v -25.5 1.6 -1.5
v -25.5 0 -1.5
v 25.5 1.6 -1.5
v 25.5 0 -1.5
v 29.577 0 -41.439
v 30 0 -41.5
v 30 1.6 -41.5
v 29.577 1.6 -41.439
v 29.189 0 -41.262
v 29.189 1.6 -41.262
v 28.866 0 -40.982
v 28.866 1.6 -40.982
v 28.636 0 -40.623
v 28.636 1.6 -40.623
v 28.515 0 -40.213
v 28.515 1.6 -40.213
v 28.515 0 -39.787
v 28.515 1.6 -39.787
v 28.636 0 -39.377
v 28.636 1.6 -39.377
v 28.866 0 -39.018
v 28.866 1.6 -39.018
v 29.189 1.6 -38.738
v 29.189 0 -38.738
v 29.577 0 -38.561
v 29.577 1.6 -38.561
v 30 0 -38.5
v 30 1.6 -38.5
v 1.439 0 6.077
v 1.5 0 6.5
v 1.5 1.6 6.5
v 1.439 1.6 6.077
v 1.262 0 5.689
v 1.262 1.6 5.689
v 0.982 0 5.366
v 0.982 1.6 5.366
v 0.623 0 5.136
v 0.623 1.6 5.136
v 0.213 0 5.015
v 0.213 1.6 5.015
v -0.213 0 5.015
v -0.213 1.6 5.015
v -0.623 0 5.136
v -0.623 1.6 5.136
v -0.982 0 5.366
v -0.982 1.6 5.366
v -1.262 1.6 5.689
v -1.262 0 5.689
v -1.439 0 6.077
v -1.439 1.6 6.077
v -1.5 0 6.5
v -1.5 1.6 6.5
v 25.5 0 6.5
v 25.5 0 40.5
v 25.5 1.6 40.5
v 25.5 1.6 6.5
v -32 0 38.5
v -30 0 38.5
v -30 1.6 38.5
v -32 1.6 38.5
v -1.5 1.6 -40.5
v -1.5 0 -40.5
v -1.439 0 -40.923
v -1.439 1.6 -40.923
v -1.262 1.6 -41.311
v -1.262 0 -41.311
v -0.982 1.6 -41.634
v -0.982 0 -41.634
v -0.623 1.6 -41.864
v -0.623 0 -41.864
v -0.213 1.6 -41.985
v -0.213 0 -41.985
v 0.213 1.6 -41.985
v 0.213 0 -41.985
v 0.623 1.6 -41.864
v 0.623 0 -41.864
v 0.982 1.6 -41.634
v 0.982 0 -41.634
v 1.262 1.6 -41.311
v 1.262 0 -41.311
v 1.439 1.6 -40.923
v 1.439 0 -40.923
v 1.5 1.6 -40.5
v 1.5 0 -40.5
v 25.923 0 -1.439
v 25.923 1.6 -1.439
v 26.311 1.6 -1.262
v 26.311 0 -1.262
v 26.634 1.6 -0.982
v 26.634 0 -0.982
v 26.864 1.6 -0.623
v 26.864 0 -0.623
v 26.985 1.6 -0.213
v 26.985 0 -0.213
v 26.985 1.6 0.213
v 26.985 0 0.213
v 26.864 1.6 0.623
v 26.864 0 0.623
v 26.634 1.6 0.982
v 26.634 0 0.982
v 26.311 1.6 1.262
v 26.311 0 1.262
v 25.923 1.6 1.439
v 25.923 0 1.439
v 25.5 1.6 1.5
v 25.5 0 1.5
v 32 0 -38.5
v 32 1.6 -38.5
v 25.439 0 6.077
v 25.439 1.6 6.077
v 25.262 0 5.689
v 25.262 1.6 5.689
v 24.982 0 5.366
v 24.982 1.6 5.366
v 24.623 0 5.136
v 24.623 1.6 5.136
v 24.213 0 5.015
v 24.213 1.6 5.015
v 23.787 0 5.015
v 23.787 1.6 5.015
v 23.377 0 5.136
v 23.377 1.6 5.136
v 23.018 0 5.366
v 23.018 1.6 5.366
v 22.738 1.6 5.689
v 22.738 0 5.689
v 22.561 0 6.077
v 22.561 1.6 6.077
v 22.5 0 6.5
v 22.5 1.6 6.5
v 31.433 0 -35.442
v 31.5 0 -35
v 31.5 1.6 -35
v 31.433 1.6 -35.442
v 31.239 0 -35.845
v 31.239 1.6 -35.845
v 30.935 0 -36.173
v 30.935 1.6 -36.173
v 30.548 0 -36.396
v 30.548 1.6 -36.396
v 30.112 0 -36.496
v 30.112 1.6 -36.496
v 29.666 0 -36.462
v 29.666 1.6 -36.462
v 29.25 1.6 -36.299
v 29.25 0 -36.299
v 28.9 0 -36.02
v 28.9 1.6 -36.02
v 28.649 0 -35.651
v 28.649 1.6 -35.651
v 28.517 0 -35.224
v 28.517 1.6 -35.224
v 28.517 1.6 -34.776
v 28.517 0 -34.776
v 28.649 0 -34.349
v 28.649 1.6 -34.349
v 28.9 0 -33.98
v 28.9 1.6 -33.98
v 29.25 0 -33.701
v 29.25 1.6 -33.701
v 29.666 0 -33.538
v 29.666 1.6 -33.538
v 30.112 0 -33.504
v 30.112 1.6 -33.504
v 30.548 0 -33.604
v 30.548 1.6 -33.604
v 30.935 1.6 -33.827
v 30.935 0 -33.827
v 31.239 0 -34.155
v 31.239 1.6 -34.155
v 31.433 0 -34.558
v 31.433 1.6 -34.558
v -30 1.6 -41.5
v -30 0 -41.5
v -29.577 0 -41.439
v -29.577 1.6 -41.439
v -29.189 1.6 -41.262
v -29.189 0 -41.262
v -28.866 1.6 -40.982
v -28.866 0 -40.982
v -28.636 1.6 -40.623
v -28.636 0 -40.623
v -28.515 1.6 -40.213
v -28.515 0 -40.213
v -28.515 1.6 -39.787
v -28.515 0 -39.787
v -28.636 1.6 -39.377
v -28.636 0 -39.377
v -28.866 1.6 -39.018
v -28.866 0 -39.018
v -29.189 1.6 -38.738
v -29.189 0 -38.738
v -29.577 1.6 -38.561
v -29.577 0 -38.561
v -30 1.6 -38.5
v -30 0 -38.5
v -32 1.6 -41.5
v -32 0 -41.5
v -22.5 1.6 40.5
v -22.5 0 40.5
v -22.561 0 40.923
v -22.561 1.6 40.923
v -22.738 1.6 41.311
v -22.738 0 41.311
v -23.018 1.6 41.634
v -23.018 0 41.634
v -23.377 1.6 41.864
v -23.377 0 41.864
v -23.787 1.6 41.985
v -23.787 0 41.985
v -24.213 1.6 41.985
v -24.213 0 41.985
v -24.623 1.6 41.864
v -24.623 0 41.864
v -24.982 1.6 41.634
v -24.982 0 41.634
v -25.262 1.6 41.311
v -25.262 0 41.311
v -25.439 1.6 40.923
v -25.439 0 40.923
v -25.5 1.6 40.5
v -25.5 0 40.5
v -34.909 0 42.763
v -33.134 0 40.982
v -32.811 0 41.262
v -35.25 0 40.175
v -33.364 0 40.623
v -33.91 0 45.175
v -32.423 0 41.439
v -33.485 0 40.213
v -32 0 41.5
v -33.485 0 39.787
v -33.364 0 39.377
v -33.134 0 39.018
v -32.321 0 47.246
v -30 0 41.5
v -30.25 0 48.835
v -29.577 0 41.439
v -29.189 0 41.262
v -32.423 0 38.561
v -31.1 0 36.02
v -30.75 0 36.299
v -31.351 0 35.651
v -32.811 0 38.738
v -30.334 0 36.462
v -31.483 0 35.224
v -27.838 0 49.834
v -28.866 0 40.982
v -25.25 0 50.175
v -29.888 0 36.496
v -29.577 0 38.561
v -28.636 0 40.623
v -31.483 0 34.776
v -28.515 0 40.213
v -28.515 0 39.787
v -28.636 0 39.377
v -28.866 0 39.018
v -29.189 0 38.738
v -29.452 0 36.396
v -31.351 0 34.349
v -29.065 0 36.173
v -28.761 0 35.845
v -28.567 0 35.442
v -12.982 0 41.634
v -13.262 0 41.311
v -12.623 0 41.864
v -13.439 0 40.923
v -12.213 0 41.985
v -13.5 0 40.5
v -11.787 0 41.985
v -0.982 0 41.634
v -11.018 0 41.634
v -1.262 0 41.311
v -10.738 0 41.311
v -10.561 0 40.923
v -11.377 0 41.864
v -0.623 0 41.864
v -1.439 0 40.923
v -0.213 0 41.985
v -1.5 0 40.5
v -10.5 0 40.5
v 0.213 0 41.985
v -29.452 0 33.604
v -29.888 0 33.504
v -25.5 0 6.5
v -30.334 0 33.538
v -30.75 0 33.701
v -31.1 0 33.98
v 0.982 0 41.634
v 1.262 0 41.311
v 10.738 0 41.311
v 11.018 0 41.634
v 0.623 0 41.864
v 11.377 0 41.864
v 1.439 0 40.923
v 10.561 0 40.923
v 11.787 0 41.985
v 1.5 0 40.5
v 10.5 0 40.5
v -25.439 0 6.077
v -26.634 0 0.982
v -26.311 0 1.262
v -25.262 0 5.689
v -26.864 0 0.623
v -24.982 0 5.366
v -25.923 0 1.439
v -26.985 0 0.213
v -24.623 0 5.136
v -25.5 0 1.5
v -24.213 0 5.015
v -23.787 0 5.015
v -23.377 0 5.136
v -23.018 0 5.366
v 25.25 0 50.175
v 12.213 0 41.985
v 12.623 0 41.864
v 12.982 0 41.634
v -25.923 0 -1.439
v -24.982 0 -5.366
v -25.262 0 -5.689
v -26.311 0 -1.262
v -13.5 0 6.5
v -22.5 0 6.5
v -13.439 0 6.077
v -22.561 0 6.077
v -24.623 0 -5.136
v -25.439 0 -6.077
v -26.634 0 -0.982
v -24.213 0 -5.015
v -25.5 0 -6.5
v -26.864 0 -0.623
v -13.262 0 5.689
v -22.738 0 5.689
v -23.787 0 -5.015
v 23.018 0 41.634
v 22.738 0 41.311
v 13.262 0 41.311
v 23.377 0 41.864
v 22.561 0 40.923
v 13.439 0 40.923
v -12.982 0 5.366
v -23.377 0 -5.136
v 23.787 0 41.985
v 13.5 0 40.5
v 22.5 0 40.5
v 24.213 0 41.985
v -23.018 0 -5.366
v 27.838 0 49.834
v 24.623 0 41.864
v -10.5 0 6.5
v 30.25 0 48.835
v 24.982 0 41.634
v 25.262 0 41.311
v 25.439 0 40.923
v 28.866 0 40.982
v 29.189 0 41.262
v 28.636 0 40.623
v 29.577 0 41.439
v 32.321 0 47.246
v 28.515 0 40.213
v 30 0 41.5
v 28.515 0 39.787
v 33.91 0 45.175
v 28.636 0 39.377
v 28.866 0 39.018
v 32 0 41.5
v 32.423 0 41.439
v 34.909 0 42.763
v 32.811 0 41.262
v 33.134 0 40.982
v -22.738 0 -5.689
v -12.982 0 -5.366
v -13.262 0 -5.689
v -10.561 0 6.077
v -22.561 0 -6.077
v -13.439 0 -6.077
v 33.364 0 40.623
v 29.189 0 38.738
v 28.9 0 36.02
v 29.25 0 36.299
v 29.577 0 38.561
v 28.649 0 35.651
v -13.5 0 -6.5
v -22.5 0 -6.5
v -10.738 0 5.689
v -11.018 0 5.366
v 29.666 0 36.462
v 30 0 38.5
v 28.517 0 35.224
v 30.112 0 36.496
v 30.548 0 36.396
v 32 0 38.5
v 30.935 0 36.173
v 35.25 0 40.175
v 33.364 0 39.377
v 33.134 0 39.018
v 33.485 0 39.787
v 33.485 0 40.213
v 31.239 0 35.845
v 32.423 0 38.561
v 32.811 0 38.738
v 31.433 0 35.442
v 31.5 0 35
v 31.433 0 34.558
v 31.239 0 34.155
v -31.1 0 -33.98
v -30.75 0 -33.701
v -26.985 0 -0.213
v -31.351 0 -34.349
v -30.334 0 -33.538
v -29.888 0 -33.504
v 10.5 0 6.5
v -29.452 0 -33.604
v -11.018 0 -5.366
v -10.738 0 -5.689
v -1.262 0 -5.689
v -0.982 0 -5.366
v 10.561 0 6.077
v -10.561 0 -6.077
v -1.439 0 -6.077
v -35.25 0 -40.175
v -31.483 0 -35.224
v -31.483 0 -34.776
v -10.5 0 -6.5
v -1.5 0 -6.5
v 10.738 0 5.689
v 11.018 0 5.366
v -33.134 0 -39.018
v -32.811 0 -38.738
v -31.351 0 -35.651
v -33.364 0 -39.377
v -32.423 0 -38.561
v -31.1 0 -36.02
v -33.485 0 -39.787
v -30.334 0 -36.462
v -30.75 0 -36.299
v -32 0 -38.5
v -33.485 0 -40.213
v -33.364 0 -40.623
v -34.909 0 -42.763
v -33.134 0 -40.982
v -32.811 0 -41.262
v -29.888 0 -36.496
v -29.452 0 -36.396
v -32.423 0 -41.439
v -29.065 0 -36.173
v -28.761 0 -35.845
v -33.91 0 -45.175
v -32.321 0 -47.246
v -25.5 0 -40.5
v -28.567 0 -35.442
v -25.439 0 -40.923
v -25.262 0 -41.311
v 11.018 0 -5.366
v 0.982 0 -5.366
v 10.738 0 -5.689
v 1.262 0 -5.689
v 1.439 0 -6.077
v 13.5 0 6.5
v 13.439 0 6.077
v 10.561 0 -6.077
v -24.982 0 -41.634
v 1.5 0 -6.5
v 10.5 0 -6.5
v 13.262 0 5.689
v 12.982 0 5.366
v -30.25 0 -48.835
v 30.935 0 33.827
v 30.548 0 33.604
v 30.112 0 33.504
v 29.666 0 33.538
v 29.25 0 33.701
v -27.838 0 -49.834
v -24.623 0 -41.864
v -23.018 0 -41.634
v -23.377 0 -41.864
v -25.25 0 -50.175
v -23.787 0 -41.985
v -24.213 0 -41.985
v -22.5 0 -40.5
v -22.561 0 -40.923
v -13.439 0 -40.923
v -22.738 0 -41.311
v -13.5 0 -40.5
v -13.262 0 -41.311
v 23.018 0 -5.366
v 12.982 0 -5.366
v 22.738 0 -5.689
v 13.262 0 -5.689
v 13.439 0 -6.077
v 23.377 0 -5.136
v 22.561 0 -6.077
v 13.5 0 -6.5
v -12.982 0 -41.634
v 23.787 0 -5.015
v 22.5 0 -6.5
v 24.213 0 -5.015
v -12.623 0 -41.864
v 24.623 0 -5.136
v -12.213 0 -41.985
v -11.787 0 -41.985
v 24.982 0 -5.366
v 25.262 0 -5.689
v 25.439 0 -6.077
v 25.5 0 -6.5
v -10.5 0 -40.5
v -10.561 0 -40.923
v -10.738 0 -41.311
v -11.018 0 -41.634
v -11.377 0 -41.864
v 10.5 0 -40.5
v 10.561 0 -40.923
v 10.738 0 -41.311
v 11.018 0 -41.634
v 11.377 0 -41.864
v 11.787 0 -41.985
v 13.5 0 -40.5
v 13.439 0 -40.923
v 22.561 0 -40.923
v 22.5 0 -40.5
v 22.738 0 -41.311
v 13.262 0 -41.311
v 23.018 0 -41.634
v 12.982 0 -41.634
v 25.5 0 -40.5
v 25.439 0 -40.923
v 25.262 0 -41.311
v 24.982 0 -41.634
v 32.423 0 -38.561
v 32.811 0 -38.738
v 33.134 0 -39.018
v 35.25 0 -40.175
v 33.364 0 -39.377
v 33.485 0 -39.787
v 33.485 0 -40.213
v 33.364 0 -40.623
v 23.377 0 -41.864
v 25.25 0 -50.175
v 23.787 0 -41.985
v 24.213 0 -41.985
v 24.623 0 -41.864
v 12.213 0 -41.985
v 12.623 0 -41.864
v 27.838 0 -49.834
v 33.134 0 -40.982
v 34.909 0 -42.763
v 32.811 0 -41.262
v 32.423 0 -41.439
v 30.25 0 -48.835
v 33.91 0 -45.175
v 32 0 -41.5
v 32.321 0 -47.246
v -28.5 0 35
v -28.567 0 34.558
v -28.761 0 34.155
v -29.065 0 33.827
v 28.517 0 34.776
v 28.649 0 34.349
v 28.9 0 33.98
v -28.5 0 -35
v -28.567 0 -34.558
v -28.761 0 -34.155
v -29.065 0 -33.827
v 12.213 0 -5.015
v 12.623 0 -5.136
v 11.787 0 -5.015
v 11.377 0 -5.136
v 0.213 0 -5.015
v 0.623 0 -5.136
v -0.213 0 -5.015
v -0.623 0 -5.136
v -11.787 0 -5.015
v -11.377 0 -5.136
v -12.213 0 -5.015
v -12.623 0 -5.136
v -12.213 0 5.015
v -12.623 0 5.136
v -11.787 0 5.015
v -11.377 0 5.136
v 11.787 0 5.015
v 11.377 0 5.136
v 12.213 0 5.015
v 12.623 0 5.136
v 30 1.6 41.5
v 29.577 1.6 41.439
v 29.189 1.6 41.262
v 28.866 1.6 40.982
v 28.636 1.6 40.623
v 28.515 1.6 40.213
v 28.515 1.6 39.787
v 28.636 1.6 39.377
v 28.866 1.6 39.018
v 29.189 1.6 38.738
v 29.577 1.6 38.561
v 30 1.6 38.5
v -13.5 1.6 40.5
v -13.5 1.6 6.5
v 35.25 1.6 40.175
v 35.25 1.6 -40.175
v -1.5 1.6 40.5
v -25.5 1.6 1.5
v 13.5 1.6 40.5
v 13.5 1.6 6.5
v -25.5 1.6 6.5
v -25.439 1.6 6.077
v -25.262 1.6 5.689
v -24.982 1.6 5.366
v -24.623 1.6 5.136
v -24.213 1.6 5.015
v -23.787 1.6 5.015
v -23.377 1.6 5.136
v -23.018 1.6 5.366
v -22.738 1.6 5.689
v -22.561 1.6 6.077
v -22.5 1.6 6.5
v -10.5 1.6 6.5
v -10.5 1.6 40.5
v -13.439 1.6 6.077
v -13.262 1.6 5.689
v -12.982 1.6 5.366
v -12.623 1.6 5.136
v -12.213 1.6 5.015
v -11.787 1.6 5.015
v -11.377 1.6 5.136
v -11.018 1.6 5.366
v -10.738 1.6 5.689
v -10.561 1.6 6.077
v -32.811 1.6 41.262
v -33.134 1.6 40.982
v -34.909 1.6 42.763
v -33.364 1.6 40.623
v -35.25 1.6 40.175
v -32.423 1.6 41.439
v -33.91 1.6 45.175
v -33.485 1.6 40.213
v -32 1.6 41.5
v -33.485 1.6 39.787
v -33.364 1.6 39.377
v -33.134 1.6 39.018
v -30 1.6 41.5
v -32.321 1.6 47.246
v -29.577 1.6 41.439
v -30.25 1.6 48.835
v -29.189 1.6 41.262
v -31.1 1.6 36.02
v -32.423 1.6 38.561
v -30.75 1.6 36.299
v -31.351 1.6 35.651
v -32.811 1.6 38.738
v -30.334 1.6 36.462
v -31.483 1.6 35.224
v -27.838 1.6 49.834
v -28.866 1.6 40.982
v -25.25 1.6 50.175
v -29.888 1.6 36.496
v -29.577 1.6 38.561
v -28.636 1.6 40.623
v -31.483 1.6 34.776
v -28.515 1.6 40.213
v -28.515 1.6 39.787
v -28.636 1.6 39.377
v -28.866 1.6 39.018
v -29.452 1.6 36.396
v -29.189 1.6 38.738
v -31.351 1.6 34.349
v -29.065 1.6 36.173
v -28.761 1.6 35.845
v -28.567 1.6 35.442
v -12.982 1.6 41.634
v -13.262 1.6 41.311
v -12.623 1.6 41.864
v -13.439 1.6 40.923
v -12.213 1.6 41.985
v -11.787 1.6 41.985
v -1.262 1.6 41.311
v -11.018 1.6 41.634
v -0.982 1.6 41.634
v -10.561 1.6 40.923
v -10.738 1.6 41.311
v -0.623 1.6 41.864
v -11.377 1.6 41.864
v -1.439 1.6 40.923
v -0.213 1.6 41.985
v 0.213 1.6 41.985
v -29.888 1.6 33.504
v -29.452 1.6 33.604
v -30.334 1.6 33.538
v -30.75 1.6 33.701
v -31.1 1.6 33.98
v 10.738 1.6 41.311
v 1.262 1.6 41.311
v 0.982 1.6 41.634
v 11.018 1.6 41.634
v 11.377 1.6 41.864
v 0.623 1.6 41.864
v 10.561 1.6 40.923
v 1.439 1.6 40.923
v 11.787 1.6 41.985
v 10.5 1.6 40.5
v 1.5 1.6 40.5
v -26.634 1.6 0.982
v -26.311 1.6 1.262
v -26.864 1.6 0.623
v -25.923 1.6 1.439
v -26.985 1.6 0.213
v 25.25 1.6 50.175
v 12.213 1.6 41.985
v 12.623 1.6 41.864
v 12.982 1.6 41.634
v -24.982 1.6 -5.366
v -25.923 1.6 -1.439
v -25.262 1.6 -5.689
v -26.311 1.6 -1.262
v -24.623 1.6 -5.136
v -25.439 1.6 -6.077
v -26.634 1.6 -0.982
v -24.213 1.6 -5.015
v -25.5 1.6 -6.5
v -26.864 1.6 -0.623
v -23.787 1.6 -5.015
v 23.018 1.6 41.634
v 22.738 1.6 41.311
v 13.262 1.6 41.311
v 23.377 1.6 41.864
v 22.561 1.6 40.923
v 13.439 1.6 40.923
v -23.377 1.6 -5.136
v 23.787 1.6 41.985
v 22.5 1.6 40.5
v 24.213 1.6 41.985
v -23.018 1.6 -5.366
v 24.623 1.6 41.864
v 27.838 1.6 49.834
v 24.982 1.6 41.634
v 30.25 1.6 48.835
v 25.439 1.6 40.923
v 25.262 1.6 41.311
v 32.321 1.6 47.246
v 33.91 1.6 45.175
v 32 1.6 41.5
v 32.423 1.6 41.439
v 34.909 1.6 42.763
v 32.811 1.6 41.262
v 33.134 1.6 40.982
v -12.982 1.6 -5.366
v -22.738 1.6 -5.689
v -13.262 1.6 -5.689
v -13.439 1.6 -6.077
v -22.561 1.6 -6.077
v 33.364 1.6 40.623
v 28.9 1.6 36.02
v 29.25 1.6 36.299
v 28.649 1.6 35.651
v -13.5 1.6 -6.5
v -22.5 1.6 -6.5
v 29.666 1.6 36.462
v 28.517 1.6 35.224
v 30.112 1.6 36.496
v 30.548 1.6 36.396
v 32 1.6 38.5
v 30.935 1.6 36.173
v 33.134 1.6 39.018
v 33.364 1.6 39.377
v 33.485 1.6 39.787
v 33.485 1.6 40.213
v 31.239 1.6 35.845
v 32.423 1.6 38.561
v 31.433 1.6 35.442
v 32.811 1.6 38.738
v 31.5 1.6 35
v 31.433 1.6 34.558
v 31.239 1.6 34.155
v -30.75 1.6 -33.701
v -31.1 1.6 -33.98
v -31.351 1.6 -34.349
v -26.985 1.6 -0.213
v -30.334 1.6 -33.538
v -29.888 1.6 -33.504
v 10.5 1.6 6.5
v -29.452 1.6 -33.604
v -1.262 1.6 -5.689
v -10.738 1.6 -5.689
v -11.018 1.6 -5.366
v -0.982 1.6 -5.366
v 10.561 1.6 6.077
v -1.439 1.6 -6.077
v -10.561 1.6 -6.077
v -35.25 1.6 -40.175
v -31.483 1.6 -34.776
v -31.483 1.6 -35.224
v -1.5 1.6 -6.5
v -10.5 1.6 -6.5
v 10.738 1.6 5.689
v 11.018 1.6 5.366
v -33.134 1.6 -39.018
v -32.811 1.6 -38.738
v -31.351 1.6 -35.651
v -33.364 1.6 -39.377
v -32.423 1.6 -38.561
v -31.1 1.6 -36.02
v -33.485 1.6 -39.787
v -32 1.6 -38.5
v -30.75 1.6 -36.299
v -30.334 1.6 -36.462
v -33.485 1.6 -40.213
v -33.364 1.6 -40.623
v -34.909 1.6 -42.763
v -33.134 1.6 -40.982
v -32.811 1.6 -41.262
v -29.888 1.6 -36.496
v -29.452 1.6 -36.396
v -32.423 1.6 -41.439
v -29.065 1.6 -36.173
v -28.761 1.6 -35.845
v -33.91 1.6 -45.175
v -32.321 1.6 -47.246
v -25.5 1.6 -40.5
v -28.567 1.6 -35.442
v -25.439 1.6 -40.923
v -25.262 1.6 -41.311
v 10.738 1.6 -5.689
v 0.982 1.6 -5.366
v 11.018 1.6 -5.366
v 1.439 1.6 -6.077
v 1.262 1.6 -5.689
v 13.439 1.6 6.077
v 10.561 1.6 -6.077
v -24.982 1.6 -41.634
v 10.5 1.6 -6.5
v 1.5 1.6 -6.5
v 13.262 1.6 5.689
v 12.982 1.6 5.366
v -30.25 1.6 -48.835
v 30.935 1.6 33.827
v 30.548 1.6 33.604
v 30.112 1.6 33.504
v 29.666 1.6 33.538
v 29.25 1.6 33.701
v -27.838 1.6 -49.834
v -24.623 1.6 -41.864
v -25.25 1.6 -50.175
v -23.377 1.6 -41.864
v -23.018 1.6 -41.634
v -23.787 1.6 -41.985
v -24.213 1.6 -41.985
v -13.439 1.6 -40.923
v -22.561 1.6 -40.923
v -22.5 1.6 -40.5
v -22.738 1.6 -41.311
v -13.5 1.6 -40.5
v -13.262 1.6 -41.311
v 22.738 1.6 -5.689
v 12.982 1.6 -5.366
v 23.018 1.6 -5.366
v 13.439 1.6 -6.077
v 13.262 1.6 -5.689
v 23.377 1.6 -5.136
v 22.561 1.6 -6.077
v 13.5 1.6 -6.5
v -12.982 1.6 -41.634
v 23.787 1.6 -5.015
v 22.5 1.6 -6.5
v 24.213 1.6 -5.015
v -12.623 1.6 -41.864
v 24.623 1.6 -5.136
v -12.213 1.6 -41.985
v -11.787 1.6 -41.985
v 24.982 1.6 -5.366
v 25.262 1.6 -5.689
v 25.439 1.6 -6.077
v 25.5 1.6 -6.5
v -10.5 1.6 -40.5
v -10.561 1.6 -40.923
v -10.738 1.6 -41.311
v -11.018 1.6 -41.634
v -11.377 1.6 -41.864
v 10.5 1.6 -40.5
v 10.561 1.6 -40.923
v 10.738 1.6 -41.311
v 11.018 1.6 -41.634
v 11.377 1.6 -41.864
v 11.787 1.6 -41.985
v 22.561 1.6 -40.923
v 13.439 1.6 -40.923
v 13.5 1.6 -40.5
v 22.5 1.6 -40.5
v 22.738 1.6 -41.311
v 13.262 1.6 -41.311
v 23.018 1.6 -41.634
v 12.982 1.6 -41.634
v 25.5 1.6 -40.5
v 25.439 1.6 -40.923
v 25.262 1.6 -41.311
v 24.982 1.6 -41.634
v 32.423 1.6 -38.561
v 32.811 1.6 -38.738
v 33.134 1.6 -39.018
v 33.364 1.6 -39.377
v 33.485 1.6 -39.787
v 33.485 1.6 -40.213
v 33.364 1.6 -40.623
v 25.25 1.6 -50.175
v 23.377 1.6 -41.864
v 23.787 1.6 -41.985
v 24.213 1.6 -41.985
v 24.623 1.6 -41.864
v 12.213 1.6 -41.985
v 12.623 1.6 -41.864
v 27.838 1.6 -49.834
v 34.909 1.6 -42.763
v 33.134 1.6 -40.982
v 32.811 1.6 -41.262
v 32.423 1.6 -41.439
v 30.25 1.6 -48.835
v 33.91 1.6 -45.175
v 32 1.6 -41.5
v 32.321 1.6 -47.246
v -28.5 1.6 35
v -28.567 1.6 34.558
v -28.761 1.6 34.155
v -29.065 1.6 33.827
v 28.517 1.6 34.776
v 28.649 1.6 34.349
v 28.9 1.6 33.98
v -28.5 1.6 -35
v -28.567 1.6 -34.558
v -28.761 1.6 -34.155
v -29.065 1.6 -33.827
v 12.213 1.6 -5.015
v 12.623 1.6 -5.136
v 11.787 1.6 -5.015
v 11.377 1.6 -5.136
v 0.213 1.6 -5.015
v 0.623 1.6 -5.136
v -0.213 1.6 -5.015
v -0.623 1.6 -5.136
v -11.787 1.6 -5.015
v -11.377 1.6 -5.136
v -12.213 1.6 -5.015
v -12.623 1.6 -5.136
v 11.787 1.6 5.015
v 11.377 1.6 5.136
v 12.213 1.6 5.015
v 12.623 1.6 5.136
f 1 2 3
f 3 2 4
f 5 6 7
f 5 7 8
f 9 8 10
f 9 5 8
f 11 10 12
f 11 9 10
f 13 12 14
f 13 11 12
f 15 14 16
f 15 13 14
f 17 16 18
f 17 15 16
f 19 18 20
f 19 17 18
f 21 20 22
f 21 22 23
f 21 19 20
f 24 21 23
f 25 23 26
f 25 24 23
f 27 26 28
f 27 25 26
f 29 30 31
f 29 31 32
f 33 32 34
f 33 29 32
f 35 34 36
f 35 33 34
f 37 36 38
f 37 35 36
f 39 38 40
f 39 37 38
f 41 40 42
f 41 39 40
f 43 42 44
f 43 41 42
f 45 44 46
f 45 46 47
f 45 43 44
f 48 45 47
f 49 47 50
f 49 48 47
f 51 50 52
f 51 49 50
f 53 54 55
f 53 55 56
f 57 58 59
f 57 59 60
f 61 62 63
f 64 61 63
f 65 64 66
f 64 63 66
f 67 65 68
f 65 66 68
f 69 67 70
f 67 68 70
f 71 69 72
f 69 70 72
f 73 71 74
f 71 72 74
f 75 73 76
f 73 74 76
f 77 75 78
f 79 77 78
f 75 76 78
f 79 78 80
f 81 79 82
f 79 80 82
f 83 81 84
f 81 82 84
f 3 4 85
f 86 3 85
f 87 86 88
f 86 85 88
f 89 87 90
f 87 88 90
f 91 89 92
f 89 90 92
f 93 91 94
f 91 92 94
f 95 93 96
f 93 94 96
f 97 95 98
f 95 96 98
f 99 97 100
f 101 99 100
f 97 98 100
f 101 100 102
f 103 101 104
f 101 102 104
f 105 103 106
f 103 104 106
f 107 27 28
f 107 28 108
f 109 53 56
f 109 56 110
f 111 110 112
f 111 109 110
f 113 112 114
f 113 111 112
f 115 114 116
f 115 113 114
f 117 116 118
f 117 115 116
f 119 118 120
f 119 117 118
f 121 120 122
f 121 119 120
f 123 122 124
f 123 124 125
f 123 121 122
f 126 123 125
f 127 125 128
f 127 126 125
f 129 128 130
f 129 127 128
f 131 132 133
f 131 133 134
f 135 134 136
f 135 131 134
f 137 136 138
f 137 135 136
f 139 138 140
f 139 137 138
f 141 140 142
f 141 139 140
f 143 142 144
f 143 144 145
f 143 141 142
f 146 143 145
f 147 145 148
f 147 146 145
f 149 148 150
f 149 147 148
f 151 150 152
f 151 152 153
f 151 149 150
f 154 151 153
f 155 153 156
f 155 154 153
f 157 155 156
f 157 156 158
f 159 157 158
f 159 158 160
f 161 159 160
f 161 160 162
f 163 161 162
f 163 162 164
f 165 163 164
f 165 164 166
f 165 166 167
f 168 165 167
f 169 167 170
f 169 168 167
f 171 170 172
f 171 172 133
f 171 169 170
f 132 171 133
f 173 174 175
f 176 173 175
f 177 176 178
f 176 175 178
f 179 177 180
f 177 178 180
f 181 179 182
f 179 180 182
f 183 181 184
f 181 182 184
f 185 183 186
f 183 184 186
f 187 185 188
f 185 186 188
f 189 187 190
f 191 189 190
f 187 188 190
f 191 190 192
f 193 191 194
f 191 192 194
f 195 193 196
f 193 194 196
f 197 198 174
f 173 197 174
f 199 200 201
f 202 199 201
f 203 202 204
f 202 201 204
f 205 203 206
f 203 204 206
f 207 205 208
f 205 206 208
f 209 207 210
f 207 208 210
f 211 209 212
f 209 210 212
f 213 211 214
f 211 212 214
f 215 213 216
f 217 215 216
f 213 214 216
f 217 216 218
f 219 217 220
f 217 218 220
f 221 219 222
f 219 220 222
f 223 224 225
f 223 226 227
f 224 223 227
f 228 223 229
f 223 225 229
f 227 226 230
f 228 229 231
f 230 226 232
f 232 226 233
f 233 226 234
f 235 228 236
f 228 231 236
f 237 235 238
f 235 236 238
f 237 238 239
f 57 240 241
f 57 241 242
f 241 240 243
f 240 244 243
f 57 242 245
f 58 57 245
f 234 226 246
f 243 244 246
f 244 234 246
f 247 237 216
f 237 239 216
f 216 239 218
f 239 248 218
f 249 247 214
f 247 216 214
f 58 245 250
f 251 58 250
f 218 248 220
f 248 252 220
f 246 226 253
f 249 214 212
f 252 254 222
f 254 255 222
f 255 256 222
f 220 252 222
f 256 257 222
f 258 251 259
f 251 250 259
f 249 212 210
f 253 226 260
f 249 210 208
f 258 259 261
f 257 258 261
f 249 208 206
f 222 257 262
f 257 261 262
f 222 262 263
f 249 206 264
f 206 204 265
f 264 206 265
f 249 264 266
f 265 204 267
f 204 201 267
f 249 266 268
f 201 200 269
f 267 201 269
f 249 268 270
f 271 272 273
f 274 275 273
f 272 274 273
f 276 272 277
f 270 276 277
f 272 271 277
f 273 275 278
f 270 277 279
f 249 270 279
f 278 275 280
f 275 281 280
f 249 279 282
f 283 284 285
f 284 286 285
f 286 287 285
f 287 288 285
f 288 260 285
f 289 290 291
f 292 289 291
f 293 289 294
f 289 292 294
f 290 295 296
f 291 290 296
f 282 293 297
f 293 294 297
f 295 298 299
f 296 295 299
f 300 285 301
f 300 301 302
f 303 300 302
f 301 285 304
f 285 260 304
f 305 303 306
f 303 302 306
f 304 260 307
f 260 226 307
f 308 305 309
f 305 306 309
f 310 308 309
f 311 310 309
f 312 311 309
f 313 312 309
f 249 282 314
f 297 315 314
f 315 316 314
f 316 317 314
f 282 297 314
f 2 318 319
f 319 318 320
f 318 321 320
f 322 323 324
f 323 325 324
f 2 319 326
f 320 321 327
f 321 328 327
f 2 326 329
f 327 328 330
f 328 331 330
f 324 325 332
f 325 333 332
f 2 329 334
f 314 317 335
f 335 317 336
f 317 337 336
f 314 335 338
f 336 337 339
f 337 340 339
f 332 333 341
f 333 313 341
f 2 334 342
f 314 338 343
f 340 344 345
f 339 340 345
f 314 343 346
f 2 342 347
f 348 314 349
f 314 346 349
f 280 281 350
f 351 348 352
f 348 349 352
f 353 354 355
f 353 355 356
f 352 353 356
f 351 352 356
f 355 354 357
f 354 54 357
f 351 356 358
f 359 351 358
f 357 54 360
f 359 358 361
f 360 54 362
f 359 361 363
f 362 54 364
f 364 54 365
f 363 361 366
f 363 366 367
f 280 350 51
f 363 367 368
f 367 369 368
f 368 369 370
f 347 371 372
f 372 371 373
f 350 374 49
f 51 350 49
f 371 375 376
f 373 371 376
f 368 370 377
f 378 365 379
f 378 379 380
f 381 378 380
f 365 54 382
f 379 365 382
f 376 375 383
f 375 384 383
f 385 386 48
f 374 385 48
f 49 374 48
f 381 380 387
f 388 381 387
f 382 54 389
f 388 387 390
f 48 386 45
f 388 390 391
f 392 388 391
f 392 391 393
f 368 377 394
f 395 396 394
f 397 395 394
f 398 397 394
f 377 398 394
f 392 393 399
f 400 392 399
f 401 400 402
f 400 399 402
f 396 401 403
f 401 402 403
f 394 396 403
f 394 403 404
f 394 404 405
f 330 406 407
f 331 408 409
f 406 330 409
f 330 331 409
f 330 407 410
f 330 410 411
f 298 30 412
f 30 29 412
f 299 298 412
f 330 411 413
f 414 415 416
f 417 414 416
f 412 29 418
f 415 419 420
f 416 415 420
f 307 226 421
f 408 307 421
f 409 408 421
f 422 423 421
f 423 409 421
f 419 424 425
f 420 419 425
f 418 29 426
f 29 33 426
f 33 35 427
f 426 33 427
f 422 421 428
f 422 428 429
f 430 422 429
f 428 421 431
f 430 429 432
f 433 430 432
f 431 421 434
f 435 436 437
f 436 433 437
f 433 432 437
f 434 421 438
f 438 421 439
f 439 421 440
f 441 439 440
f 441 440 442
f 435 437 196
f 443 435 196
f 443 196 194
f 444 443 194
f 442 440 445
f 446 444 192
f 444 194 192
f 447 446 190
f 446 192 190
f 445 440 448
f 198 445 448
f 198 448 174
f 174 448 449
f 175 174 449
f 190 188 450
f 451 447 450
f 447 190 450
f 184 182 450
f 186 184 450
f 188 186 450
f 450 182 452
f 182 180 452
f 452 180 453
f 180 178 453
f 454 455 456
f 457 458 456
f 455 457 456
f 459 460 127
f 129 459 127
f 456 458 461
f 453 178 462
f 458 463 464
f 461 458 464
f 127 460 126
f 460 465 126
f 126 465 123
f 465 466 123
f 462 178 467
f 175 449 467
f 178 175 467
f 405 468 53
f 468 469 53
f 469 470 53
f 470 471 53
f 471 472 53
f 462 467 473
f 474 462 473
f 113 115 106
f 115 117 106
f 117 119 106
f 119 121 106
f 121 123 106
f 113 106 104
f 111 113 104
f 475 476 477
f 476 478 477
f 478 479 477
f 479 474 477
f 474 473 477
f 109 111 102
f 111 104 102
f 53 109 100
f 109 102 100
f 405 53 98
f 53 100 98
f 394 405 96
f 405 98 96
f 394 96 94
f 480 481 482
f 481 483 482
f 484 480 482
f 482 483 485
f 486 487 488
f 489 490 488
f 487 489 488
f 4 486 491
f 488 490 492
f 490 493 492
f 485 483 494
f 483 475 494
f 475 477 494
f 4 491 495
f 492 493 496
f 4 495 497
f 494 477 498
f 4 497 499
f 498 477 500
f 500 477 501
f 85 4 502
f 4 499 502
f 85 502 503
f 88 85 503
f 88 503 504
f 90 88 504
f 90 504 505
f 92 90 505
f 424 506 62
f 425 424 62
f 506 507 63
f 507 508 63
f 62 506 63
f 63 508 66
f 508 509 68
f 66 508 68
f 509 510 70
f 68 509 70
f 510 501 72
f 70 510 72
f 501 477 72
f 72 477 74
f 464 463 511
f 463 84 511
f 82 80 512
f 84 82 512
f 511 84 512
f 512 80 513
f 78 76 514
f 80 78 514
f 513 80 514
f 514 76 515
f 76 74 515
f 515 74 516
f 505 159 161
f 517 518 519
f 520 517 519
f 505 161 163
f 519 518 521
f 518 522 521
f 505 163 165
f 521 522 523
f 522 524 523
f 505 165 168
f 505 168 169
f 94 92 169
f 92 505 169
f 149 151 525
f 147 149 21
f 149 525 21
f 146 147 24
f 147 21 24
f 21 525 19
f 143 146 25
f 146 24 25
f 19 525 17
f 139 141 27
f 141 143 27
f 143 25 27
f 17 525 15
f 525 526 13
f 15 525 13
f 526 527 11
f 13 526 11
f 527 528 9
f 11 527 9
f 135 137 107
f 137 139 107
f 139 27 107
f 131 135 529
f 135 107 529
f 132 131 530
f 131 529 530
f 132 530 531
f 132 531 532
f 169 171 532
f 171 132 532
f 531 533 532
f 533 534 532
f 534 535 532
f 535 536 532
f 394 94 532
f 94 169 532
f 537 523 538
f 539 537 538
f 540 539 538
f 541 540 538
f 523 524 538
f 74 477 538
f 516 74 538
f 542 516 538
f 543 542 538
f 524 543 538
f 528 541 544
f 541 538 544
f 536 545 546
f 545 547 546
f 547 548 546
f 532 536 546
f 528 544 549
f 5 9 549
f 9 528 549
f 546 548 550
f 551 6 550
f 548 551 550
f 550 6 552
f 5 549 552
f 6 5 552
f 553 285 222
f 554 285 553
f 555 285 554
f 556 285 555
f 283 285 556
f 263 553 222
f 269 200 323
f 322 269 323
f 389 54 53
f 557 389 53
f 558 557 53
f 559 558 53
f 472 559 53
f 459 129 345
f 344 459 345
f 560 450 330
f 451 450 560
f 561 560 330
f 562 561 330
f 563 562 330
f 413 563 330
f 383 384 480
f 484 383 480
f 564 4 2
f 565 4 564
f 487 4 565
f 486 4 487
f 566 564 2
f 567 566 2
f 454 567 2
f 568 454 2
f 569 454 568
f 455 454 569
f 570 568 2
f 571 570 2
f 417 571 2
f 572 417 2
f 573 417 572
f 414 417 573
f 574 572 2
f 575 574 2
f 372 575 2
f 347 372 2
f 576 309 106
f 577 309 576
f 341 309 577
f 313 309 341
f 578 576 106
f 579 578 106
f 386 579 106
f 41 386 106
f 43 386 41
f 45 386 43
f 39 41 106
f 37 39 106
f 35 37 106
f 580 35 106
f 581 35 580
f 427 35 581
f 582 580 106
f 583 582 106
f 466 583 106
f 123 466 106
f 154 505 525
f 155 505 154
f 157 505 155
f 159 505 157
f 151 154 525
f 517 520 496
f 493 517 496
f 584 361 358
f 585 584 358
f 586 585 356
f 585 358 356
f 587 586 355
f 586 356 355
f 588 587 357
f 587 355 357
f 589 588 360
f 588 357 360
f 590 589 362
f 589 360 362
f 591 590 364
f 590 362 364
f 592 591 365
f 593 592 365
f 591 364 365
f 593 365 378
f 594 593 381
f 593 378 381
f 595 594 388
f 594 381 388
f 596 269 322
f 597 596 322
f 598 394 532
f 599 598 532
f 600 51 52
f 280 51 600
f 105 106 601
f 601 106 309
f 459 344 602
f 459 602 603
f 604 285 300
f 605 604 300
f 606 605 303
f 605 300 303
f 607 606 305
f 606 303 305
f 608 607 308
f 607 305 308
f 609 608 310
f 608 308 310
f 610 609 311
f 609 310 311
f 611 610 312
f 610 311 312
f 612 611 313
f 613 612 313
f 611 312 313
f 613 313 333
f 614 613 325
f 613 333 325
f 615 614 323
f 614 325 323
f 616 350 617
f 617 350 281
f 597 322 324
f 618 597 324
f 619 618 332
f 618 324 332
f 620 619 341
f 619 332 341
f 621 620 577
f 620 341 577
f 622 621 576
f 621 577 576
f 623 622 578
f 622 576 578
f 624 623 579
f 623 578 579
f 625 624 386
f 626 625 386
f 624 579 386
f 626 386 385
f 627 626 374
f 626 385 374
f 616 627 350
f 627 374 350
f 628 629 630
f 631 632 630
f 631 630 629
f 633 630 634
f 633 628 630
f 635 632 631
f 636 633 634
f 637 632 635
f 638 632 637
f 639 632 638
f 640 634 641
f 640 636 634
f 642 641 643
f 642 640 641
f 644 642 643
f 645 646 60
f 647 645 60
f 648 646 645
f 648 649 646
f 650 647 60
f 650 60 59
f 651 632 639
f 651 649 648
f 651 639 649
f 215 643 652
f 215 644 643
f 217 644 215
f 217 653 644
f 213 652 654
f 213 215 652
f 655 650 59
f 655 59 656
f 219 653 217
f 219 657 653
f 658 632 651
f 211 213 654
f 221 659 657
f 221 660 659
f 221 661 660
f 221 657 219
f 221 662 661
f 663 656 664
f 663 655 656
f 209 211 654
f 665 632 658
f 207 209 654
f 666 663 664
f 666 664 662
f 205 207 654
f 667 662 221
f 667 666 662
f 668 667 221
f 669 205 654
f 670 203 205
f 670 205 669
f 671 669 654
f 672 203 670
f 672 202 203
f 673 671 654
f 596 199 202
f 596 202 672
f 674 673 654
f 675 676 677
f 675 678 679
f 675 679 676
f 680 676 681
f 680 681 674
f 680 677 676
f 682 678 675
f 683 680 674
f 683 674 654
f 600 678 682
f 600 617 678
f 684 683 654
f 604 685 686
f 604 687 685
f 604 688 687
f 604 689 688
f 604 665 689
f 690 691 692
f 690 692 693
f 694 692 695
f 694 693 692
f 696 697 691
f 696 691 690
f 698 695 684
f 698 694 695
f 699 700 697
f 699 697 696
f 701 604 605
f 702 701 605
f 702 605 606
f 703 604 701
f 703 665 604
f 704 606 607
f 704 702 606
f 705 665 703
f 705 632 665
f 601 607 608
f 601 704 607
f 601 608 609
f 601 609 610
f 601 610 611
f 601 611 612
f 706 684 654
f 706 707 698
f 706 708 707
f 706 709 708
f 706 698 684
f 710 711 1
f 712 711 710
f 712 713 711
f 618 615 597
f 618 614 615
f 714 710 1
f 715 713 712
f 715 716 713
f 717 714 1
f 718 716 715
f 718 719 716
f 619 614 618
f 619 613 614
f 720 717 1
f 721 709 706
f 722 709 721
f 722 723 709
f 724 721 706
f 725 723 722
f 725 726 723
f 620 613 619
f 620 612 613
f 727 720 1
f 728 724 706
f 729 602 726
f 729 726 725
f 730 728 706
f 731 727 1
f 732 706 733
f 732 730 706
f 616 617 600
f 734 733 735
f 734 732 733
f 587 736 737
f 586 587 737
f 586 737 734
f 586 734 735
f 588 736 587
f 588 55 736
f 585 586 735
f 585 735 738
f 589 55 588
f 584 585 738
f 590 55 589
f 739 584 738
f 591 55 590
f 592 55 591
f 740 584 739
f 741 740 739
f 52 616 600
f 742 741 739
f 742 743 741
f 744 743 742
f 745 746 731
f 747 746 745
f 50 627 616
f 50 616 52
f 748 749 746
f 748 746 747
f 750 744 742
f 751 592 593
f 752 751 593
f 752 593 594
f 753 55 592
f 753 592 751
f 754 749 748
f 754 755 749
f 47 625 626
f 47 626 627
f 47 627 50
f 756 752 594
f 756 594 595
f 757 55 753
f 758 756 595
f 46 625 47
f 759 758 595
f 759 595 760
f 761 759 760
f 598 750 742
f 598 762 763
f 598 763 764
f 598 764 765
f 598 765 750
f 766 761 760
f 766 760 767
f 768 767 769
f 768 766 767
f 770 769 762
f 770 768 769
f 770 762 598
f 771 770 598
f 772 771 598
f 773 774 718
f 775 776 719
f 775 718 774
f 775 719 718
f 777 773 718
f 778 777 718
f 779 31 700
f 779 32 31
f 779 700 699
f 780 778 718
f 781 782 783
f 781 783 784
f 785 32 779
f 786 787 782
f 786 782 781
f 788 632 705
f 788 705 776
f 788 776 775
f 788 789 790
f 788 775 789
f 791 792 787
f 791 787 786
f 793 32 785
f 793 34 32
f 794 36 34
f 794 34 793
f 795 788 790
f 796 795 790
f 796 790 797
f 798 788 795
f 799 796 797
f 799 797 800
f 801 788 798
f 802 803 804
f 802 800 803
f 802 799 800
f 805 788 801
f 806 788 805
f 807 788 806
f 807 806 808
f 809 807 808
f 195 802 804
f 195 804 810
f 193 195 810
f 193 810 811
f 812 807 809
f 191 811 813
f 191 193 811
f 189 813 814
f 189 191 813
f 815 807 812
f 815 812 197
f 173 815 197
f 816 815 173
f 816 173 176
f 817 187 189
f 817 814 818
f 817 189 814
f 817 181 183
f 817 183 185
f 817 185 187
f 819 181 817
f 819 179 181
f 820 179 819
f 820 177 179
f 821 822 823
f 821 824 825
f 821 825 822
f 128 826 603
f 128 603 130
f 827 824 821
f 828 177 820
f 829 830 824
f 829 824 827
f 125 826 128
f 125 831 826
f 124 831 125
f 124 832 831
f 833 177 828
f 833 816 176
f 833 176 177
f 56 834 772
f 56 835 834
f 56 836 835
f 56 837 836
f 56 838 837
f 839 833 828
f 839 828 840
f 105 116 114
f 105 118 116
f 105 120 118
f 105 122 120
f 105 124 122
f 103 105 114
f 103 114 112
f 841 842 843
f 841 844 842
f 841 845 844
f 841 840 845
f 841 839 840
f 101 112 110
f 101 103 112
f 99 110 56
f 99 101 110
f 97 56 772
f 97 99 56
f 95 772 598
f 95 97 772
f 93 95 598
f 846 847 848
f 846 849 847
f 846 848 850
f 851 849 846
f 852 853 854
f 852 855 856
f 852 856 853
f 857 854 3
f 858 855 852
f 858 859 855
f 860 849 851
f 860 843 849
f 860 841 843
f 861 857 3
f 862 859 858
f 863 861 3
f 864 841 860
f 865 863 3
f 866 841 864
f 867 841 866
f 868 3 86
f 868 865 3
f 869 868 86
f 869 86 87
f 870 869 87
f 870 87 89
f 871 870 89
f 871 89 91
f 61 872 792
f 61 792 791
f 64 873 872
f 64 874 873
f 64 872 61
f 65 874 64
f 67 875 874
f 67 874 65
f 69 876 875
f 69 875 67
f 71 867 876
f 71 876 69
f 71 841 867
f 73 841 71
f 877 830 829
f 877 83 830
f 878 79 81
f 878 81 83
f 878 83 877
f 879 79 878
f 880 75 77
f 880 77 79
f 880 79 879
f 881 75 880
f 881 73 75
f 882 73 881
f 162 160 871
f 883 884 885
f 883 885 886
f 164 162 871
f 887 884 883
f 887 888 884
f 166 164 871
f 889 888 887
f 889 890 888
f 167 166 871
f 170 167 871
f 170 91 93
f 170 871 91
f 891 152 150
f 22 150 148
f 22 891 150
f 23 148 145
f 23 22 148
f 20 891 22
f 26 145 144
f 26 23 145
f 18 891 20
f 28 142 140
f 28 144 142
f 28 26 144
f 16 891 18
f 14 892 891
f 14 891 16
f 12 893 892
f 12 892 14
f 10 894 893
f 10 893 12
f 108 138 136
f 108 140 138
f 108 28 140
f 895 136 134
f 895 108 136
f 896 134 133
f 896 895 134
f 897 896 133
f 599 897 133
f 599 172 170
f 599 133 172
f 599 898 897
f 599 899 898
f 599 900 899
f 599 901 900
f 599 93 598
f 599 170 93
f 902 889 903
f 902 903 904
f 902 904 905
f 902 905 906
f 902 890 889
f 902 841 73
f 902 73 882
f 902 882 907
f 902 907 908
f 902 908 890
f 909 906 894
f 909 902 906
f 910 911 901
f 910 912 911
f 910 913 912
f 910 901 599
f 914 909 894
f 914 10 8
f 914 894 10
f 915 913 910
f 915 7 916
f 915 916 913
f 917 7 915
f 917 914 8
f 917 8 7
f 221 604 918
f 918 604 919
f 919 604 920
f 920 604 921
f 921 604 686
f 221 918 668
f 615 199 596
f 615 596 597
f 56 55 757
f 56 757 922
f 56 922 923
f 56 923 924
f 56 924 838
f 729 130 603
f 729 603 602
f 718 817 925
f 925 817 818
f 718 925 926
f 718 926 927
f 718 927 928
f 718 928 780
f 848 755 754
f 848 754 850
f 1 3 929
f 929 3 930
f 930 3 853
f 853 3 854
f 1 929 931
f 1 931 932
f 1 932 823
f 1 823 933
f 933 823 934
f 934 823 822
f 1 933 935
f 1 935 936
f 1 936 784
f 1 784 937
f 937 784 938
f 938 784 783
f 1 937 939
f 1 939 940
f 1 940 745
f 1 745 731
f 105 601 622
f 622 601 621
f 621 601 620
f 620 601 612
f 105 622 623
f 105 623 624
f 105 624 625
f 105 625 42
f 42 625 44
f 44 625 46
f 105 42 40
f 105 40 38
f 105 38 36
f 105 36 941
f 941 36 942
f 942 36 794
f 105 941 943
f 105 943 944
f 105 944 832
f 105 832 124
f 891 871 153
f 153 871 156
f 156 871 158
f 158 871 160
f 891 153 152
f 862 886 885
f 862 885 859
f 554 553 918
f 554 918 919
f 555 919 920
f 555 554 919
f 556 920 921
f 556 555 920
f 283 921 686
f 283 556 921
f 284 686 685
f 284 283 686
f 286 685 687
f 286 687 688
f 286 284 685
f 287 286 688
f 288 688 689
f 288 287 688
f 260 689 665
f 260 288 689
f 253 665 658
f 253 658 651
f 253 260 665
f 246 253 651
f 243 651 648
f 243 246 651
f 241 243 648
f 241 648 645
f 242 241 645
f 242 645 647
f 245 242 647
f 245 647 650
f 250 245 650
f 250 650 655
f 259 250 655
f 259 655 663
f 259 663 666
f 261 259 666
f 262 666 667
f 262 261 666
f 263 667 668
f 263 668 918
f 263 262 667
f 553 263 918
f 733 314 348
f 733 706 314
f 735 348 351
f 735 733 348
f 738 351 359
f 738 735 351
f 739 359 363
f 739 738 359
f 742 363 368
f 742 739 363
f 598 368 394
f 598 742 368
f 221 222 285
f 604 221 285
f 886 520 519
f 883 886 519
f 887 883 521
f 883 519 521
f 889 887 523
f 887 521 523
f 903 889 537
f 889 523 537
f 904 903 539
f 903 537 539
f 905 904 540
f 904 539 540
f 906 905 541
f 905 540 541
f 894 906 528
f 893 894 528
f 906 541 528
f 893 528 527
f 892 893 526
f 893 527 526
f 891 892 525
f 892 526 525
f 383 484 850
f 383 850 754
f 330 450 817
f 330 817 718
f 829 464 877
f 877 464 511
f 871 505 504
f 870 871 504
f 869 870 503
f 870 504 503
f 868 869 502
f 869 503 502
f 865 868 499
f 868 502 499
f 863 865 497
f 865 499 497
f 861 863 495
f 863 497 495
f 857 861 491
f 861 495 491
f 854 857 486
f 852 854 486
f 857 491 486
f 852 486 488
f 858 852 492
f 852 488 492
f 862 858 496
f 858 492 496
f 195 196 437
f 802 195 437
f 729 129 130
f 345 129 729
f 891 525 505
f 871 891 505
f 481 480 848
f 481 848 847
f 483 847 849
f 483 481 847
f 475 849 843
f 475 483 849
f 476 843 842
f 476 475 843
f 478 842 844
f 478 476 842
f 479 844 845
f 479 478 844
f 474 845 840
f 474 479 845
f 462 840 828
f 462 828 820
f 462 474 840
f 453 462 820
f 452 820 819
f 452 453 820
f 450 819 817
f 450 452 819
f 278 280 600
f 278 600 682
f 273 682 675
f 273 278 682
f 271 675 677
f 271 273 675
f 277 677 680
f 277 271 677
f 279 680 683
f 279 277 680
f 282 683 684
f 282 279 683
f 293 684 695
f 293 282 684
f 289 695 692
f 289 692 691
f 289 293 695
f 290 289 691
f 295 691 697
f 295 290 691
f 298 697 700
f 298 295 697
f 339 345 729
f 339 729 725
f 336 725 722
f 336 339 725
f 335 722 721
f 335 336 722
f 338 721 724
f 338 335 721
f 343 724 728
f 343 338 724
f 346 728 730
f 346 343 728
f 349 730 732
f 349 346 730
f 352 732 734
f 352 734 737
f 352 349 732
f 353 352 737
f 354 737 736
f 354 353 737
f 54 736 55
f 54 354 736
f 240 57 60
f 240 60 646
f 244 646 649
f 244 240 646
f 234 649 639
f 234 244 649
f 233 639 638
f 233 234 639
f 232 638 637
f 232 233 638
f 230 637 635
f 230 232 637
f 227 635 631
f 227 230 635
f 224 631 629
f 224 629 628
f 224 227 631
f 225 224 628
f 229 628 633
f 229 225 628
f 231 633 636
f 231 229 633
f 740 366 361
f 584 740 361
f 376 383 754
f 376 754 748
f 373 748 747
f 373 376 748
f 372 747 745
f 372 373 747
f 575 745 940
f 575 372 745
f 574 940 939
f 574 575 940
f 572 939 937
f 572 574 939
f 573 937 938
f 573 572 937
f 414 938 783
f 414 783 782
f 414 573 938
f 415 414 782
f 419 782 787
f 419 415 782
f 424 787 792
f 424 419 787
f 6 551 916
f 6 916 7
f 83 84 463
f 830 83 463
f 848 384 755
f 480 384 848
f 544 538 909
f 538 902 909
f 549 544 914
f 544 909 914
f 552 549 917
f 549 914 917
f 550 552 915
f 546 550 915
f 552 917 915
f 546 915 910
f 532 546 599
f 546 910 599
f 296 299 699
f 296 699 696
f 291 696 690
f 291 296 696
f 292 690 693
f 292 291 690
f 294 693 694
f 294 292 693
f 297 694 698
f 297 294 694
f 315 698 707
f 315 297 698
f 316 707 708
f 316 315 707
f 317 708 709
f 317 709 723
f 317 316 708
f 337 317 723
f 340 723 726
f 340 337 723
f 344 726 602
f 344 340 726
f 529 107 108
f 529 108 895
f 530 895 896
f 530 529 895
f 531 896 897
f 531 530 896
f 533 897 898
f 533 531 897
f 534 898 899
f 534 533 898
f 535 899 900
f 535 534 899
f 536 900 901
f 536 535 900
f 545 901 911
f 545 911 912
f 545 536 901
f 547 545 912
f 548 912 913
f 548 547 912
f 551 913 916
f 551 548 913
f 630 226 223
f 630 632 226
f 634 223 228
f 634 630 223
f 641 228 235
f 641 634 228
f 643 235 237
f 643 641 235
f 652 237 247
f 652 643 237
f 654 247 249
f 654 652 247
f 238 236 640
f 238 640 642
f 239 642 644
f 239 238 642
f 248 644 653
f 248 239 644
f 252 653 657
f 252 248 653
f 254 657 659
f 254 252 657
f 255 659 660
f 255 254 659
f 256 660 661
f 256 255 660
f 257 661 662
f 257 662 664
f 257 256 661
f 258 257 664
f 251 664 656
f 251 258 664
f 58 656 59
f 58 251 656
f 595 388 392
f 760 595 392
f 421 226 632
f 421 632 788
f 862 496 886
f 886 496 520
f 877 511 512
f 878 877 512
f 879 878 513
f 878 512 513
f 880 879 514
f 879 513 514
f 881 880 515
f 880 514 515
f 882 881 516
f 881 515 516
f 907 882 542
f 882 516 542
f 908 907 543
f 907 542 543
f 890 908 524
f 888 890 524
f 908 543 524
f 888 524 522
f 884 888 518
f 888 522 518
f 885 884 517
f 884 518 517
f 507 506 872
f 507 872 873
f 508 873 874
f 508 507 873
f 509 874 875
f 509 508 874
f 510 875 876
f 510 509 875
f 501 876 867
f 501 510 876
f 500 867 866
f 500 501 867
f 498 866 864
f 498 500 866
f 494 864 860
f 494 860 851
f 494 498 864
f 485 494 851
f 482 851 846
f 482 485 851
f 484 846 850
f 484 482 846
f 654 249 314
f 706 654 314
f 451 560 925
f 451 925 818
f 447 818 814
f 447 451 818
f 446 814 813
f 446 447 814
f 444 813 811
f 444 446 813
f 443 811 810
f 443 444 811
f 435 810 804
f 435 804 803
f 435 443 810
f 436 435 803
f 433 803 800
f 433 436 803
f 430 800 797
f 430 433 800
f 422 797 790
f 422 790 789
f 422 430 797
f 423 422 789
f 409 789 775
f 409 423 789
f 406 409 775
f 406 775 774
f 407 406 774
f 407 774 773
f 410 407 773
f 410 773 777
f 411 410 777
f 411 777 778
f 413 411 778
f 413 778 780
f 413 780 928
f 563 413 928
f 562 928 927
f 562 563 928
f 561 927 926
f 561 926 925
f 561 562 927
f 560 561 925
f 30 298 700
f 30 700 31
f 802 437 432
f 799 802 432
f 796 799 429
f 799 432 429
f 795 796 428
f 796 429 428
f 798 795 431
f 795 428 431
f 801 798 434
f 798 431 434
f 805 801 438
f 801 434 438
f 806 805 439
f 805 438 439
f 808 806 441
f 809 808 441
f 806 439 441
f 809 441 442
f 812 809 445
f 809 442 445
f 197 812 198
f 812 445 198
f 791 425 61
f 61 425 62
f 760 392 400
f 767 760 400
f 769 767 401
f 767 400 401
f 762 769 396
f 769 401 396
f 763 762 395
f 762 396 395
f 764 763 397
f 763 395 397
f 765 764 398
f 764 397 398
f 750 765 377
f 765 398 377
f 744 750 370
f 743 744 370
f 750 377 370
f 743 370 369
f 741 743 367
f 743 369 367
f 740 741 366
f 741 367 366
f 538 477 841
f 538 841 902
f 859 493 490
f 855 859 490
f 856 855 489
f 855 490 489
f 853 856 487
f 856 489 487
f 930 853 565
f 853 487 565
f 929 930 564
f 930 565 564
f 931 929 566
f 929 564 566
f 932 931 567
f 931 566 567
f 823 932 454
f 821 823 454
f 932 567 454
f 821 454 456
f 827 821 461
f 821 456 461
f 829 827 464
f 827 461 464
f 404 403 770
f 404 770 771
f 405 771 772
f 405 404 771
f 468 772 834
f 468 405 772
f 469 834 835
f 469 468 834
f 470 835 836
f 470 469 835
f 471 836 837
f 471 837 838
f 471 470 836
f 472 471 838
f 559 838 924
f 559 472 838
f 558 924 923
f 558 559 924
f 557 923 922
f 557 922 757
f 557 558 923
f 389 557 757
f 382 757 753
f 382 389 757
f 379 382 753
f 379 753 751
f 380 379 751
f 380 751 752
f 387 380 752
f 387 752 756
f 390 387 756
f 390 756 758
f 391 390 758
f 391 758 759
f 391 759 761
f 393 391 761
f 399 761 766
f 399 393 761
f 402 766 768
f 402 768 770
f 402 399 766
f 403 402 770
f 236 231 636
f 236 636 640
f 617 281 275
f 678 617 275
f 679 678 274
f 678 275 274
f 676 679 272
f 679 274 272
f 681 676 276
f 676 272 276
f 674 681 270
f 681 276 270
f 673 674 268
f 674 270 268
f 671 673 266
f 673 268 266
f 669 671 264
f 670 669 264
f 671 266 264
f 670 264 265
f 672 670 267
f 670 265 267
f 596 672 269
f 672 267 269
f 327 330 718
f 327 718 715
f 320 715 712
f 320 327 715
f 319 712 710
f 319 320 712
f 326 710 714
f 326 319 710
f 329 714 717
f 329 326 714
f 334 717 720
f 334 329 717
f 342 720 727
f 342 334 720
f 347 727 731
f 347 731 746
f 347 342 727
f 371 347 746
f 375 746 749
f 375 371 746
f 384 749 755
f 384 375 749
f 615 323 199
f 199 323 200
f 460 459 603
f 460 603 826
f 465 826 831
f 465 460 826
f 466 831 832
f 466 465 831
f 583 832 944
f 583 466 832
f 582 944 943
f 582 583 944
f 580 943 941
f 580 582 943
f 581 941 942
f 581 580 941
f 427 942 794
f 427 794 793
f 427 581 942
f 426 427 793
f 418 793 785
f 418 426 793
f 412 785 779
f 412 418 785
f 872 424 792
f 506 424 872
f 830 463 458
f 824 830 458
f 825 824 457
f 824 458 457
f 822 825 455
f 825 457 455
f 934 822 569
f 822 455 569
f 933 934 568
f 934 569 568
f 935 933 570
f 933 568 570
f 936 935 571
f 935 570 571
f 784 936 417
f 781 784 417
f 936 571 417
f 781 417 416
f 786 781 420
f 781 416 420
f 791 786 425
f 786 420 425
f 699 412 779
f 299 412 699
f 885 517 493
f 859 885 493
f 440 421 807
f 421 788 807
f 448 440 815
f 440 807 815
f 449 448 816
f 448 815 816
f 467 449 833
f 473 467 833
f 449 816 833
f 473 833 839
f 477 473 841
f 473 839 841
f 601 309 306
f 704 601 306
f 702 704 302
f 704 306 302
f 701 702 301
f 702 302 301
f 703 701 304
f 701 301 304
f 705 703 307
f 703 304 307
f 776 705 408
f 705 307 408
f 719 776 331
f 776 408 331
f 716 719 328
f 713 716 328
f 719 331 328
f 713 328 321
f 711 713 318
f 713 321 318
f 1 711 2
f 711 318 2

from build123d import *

# Parameters (mm, degrees)
SKETCH_1_W      = 70.5
SKETCH_1_H      = 100.35
SKETCH_1_R      = 1.5
EXTRUDE_1_DEPTH = 1.6
FILLET_1_R      = 10


with BuildPart() as part:
    # 草圖1 → 填料-伸長1 (new body)
    with BuildSketch(Plane(origin=(0, 0, 0), x_dir=(1, 0, 0), z_dir=(0, 1, 0))):
        Rectangle(SKETCH_1_W, SKETCH_1_H)
        with Locations((-30, 35)):
            Circle(SKETCH_1_R, mode=Mode.SUBTRACT)
        with Locations((30, 35)):
            Circle(SKETCH_1_R, mode=Mode.SUBTRACT)
        with Locations((-30, -35)):
            Circle(SKETCH_1_R, mode=Mode.SUBTRACT)
        with Locations((30, -35)):
            Circle(SKETCH_1_R, mode=Mode.SUBTRACT)
        with BuildLine():
            Line((-25.5, 1.5), (25.5, 1.5))
            ThreePointArc((25.5, 1.5), (27, 0), (25.5, -1.5))
            Line((25.5, -1.5), (-25.5, -1.5))
            ThreePointArc((-25.5, -1.5), (-27, 0), (-25.5, 1.5))
        make_face(mode=Mode.SUBTRACT)
        with BuildLine():
            Line((1.5, 40.5), (1.5, 6.5))
            ThreePointArc((1.5, 6.5), (0, 5), (-1.5, 6.5))
            Line((-1.5, 6.5), (-1.5, 40.5))
            ThreePointArc((-1.5, 40.5), (0, 42), (1.5, 40.5))
        make_face(mode=Mode.SUBTRACT)
        with BuildLine():
            Line((1.5, -40.5), (1.5, -6.5))
            ThreePointArc((1.5, -6.5), (0, -5), (-1.5, -6.5))
            Line((-1.5, -6.5), (-1.5, -40.5))
            ThreePointArc((-1.5, -40.5), (0, -42), (1.5, -40.5))
        make_face(mode=Mode.SUBTRACT)
        with BuildLine():
            Line((13.5, 40.5), (13.5, 6.5))
            ThreePointArc((13.5, 6.5), (12, 5), (10.5, 6.5))
            Line((10.5, 6.5), (10.5, 40.5))
            ThreePointArc((10.5, 40.5), (12, 42), (13.5, 40.5))
        make_face(mode=Mode.SUBTRACT)
        with BuildLine():
            Line((13.5, -40.5), (13.5, -6.5))
            ThreePointArc((13.5, -6.5), (12, -5), (10.5, -6.5))
            Line((10.5, -6.5), (10.5, -40.5))
            ThreePointArc((10.5, -40.5), (12, -42), (13.5, -40.5))
        make_face(mode=Mode.SUBTRACT)
        with BuildLine():
            Line((25.5, 40.5), (25.5, 6.5))
            ThreePointArc((25.5, 6.5), (24, 5), (22.5, 6.5))
            Line((22.5, 6.5), (22.5, 40.5))
            ThreePointArc((22.5, 40.5), (24, 42), (25.5, 40.5))
        make_face(mode=Mode.SUBTRACT)
        with BuildLine():
            Line((25.5, -40.5), (25.5, -6.5))
            ThreePointArc((25.5, -6.5), (24, -5), (22.5, -6.5))
            Line((22.5, -6.5), (22.5, -40.5))
            ThreePointArc((22.5, -40.5), (24, -42), (25.5, -40.5))
        make_face(mode=Mode.SUBTRACT)
        with BuildLine():
            Line((-25.5, -40.5), (-25.5, -6.5))
            ThreePointArc((-25.5, -6.5), (-24, -5), (-22.5, -6.5))
            Line((-22.5, -6.5), (-22.5, -40.5))
            ThreePointArc((-22.5, -40.5), (-24, -42), (-25.5, -40.5))
        make_face(mode=Mode.SUBTRACT)
        with BuildLine():
            Line((-13.5, -40.5), (-13.5, -6.5))
            ThreePointArc((-13.5, -6.5), (-12, -5), (-10.5, -6.5))
            Line((-10.5, -6.5), (-10.5, -40.5))
            ThreePointArc((-10.5, -40.5), (-12, -42), (-13.5, -40.5))
        make_face(mode=Mode.SUBTRACT)
        with BuildLine():
            Line((-13.5, 40.5), (-13.5, 6.5))
            ThreePointArc((-13.5, 6.5), (-12, 5), (-10.5, 6.5))
            Line((-10.5, 6.5), (-10.5, 40.5))
            ThreePointArc((-10.5, 40.5), (-12, 42), (-13.5, 40.5))
        make_face(mode=Mode.SUBTRACT)
        with BuildLine():
            Line((-25.5, 40.5), (-25.5, 6.5))
            ThreePointArc((-25.5, 6.5), (-24, 5), (-22.5, 6.5))
            Line((-22.5, 6.5), (-22.5, 40.5))
            ThreePointArc((-22.5, 40.5), (-24, 42), (-25.5, 40.5))
        make_face(mode=Mode.SUBTRACT)
        with BuildLine():
            Line((-32, 41.5), (-30, 41.5))
            ThreePointArc((-30, 41.5), (-28.5, 40), (-30, 38.5))
            Line((-30, 38.5), (-32, 38.5))
            ThreePointArc((-32, 38.5), (-33.5, 40), (-32, 41.5))
        make_face(mode=Mode.SUBTRACT)
        with BuildLine():
            Line((32, 41.5), (30, 41.5))
            ThreePointArc((30, 41.5), (28.5, 40), (30, 38.5))
            Line((30, 38.5), (32, 38.5))
            ThreePointArc((32, 38.5), (33.5, 40), (32, 41.5))
        make_face(mode=Mode.SUBTRACT)
        with BuildLine():
            Line((32, -41.5), (30, -41.5))
            ThreePointArc((30, -41.5), (28.5, -40), (30, -38.5))
            Line((30, -38.5), (32, -38.5))
            ThreePointArc((32, -38.5), (33.5, -40), (32, -41.5))
        make_face(mode=Mode.SUBTRACT)
        with BuildLine():
            Line((-32, -41.5), (-30, -41.5))
            ThreePointArc((-30, -41.5), (-28.5, -40), (-30, -38.5))
            Line((-30, -38.5), (-32, -38.5))
            ThreePointArc((-32, -38.5), (-33.5, -40), (-32, -41.5))
        make_face(mode=Mode.SUBTRACT)
    extrude(amount=EXTRUDE_1_DEPTH)

    # 圓角1
    fillet_1_edges = [part.edges().sort_by_distance(p)[0] for p in [
        (35.25, 0.8, 50.175),
        (-35.25, 0.8, 50.175),
        (-35.25, 0.8, -50.175),
        (35.25, 0.8, -50.175),
    ]]
    fillet(fillet_1_edges, radius=FILLET_1_R)


solid = part.part
